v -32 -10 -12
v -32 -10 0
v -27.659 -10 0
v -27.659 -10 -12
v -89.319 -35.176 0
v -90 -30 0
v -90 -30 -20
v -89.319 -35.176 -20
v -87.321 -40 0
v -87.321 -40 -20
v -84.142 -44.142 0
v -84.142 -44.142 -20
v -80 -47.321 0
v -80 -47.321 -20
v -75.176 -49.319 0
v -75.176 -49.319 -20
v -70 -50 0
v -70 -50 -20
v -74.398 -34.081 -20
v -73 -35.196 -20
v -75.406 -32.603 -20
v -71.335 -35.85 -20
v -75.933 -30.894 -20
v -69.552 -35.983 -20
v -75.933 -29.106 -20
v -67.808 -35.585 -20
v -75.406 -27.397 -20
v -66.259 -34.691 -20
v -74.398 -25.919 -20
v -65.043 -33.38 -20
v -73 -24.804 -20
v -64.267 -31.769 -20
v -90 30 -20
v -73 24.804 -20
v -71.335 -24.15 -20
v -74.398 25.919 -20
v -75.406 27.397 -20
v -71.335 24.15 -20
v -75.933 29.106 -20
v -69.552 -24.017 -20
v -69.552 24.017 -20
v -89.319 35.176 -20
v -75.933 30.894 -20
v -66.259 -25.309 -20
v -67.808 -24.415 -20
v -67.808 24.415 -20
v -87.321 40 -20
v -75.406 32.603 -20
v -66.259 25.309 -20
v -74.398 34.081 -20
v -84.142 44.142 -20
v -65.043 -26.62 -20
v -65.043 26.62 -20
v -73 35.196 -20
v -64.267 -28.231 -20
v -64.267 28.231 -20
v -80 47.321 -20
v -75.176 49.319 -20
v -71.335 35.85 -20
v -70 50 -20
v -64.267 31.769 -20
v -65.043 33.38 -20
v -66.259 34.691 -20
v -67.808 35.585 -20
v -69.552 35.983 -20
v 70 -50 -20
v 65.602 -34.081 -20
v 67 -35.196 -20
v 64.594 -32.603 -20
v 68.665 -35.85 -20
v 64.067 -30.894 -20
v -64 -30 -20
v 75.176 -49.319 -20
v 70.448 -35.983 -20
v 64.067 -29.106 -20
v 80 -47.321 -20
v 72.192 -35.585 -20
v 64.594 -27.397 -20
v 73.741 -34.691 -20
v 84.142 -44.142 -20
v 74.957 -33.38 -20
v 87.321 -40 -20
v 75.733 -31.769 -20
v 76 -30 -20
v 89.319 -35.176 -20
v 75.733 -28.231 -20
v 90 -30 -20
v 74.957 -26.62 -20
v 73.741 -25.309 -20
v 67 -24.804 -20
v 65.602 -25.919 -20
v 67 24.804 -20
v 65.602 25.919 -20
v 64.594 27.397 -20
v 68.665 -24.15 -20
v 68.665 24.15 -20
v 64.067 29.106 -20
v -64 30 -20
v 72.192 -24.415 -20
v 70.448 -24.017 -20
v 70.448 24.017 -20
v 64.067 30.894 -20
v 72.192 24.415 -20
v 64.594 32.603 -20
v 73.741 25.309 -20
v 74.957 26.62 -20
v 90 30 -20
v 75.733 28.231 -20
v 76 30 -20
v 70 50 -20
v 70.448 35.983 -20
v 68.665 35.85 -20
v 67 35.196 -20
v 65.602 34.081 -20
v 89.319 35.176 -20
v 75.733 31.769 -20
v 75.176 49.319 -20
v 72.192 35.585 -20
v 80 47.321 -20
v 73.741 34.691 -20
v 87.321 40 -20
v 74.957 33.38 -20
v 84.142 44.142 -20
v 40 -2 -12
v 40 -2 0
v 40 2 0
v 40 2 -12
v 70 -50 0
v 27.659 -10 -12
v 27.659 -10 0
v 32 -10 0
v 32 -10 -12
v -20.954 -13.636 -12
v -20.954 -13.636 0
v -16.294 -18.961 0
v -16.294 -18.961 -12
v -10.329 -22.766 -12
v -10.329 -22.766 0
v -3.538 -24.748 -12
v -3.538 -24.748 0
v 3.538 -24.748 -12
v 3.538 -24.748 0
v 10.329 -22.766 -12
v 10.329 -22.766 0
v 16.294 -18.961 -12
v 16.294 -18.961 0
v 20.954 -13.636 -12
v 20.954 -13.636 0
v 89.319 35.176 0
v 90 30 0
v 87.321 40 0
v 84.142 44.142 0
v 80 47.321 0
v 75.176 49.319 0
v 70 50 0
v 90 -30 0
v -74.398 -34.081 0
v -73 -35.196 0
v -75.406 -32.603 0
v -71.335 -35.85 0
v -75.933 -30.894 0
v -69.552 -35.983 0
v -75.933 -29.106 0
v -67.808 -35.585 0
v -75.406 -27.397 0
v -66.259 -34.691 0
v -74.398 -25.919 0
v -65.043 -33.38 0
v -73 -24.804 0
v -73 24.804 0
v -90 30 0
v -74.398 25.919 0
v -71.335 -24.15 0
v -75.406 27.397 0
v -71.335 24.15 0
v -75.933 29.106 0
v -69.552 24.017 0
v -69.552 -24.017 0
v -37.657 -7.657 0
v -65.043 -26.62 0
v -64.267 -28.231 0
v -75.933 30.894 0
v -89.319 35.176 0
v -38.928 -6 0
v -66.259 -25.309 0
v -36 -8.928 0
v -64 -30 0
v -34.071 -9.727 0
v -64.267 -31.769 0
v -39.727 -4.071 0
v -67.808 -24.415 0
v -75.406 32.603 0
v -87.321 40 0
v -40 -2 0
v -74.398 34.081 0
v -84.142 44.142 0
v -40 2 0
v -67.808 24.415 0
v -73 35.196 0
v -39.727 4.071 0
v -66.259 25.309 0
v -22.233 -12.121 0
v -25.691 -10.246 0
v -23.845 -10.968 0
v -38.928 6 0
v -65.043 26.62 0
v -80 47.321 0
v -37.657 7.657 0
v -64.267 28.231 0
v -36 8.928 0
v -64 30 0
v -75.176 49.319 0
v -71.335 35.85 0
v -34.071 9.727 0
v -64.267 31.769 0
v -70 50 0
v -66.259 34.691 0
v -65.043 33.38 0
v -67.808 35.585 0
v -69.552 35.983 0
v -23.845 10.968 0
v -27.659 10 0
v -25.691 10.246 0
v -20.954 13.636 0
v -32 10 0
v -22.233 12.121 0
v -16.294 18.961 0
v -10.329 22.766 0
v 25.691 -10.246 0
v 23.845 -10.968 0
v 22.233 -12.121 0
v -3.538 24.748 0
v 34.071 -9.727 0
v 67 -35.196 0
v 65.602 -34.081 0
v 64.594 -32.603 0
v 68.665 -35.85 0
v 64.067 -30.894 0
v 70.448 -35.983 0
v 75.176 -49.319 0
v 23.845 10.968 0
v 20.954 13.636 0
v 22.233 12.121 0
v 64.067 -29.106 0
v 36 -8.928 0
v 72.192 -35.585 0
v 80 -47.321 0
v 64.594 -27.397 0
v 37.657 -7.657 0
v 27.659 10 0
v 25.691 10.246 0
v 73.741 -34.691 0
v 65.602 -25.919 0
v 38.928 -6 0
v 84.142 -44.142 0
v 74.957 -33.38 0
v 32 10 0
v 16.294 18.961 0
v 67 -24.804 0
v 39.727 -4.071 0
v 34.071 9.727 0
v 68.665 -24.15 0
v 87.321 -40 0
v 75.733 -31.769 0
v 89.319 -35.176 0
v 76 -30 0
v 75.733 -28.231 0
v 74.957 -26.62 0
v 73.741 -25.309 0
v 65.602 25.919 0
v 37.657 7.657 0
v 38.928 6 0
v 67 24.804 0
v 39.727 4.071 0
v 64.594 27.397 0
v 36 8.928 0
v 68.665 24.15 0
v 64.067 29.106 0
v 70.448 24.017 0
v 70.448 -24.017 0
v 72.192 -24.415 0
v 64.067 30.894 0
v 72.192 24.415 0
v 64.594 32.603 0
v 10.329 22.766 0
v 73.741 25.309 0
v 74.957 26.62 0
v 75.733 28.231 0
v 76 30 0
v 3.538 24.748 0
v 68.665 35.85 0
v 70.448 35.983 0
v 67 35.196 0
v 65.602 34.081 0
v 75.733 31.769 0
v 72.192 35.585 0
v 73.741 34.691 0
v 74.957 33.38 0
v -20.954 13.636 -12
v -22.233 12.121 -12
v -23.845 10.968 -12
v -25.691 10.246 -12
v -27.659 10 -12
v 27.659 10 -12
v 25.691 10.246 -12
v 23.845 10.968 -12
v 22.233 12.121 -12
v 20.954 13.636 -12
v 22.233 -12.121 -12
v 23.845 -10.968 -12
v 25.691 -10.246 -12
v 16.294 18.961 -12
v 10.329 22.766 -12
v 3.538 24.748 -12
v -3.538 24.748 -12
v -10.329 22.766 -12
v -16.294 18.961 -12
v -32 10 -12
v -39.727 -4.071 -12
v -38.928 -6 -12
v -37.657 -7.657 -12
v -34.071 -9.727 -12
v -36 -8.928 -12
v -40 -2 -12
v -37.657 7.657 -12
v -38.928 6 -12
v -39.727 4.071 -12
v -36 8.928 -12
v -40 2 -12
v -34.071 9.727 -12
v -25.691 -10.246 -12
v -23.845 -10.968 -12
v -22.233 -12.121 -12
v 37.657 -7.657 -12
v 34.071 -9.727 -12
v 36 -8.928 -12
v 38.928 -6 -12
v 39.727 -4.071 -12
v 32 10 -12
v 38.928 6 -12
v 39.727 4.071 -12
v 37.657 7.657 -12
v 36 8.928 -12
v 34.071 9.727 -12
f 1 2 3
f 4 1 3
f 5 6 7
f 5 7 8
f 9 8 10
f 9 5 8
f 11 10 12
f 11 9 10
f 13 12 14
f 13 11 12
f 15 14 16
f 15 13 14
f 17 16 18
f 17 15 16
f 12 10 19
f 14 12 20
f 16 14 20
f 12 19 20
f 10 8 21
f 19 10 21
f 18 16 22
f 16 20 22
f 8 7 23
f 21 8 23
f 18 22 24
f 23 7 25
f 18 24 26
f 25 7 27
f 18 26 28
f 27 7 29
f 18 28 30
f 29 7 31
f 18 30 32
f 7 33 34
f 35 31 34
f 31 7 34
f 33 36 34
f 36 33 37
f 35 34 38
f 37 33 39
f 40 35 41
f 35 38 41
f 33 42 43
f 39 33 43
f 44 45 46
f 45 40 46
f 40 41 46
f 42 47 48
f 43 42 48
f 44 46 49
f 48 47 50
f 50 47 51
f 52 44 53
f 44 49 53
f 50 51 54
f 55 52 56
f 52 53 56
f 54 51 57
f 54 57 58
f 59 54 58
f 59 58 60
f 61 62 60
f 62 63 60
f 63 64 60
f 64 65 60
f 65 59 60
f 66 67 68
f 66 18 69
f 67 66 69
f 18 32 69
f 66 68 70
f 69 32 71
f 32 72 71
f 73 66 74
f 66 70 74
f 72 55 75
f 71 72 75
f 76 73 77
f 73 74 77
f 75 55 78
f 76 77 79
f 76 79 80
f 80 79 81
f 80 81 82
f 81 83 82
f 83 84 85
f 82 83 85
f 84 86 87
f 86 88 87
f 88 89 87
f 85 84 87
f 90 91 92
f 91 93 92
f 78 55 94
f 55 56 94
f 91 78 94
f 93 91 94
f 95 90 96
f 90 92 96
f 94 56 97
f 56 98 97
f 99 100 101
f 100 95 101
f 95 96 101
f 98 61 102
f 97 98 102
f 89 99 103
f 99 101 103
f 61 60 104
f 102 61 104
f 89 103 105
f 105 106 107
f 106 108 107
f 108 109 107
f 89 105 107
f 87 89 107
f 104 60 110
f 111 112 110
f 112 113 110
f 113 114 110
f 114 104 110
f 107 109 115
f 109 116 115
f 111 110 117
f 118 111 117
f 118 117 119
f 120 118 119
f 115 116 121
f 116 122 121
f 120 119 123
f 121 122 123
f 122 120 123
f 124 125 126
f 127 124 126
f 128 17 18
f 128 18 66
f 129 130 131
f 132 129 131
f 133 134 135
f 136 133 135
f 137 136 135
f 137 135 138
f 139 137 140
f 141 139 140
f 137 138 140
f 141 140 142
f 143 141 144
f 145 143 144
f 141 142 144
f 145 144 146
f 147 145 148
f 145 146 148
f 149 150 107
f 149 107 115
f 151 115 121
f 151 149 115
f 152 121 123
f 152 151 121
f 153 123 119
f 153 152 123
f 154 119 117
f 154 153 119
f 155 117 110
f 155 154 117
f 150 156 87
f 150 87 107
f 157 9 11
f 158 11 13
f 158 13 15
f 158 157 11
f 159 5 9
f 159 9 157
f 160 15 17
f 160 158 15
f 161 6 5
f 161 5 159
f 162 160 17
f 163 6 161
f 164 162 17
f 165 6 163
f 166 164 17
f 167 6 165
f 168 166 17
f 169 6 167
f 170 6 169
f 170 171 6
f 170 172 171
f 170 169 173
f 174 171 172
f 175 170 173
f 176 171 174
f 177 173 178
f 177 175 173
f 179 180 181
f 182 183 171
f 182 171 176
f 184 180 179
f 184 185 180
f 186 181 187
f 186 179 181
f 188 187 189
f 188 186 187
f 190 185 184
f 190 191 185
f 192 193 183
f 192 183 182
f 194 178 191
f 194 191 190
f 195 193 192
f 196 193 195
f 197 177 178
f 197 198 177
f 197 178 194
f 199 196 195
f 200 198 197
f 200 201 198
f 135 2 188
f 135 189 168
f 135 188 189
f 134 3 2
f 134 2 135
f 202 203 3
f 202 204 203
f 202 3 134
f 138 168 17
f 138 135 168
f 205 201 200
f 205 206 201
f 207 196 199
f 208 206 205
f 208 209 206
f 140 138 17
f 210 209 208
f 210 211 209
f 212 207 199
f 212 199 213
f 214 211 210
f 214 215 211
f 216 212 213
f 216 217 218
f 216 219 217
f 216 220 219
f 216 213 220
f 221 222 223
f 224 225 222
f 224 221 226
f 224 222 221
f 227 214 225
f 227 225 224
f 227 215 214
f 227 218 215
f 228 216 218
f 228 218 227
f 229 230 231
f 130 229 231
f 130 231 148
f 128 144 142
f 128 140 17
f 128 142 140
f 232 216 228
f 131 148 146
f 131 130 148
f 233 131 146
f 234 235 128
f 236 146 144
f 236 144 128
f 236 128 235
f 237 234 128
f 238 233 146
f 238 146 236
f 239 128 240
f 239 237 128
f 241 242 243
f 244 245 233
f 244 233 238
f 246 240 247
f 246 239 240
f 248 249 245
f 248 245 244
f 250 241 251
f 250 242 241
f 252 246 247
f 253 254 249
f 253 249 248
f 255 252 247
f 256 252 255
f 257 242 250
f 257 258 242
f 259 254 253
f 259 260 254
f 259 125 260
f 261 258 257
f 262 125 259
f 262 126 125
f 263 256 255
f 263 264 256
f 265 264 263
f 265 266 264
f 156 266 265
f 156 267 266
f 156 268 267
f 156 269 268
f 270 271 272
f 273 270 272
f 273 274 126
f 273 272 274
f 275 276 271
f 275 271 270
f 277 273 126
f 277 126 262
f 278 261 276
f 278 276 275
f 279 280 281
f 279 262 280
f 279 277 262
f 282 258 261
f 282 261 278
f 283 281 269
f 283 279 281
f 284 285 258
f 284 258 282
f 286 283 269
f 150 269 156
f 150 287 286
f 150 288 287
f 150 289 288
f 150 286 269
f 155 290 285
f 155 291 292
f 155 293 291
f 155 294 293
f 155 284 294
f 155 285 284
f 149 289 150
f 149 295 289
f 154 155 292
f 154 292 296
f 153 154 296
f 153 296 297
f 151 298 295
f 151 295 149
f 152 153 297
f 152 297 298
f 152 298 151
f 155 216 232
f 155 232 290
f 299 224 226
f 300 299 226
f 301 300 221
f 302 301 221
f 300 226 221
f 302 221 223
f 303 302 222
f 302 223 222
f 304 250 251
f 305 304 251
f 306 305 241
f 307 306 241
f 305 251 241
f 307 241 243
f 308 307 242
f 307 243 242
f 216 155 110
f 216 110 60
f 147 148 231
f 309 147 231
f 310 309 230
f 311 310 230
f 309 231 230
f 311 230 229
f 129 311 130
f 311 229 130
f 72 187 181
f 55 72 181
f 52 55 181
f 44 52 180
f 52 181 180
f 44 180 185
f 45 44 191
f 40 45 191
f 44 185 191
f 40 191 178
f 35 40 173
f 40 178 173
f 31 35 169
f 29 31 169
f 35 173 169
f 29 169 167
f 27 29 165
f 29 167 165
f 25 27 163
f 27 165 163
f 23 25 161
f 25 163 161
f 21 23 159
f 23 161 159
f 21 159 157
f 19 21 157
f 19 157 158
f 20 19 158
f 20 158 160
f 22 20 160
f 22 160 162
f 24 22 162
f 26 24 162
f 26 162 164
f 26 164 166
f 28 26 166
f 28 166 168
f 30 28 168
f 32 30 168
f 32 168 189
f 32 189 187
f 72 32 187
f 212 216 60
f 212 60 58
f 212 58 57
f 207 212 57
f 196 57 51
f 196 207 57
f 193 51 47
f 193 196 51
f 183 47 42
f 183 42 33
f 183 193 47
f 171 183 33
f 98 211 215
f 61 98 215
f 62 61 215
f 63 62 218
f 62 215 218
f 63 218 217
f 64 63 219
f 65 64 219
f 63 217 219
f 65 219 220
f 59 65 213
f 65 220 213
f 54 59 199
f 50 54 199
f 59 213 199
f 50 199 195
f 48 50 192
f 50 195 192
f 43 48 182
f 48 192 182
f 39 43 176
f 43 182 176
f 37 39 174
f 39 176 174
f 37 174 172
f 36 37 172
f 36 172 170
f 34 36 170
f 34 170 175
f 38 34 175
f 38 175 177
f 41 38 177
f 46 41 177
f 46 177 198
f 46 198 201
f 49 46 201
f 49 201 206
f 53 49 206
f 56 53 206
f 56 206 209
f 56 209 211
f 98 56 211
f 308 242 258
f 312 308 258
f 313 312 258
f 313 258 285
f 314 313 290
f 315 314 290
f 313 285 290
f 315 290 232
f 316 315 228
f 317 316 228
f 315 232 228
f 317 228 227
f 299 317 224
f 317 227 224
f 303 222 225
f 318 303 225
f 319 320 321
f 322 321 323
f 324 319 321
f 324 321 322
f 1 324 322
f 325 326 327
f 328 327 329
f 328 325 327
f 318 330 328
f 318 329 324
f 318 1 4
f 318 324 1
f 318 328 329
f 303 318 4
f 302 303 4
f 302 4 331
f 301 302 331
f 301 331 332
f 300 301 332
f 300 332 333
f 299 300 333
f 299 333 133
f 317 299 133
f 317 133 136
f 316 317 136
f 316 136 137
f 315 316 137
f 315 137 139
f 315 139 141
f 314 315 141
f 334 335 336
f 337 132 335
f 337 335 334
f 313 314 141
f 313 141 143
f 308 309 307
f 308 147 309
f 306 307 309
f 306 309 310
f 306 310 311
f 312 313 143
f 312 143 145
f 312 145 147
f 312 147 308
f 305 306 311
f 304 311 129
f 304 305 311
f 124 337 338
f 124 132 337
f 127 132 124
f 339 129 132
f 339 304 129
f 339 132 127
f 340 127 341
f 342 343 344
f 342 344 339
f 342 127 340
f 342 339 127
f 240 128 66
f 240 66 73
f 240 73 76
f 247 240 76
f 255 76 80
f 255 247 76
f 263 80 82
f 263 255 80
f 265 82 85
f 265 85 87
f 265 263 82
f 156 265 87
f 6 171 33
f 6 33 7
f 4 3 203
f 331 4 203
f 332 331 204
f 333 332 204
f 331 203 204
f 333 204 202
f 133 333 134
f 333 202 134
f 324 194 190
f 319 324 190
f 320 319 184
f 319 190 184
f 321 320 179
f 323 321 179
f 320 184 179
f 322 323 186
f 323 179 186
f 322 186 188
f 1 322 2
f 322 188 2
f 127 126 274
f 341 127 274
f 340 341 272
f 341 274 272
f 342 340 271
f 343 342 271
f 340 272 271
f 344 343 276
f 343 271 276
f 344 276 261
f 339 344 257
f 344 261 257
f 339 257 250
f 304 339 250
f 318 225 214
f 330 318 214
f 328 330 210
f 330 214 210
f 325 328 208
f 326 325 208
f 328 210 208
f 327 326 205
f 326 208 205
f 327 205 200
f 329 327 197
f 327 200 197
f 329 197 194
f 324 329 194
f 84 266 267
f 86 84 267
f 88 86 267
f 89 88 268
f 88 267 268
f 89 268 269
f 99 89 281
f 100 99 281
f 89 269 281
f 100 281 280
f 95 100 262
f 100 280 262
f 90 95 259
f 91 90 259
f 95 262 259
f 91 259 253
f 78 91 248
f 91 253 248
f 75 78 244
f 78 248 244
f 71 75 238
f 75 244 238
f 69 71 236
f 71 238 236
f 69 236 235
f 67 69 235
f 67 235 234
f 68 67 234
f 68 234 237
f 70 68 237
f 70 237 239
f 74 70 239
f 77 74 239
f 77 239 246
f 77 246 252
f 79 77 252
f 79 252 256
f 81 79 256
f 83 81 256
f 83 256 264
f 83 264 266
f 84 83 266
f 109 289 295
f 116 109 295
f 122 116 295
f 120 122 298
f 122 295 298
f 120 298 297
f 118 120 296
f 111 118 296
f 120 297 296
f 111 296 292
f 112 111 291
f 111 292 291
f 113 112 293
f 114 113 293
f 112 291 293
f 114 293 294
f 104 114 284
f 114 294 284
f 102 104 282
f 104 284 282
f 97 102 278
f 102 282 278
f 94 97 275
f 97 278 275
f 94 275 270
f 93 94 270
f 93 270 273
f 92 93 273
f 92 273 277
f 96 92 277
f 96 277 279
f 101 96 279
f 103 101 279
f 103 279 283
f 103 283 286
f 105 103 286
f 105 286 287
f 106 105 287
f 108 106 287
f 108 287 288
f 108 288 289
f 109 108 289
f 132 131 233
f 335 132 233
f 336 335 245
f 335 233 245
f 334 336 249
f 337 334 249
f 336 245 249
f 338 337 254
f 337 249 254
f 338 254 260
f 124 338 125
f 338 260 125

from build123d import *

# Parameters (mm, degrees)
F1_DEPTH = 20
F2_R     = 6
F3_DEPTH = 25
F5_DEPTH = 12


with BuildPart() as f1:
    # F0 (on Top) → F1 (new body)
    with BuildSketch(Plane.XY):
        with BuildLine():
            ThreePointArc((90, 30), (84.142136, 44.142136), (70, 50))
            Line((70, 50), (-70, 50))
            ThreePointArc((-70, 50), (-84.142136, 44.142136), (-90, 30))
            Line((-90, 30), (-90, -30))
            ThreePointArc((-90, -30), (-84.142136, -44.142136), (-70, -50))
            Line((-70, -50), (70, -50))
            ThreePointArc((70, -50), (84.142136, -44.142136), (90, -30))
            Line((90, -30), (90, 30))
        make_face()
    extrude(amount=-F1_DEPTH)

    # F2 (on face) → F3 (cut)
    with BuildSketch(Plane.XY):
        with Locations((70, 30)):
            Circle(F2_R)
        with Locations((-70, 30)):
            Circle(F2_R)
        with Locations((70, -30)):
            Circle(F2_R)
        with Locations((-70, -30)):
            Circle(F2_R)
    extrude(amount=-F3_DEPTH, mode=Mode.SUBTRACT)

    # F4 (on face) → F5 (cut)
    with BuildSketch(Plane.XY):
        with BuildLine():
            Line((27.658633, -10), (32, -10))
            ThreePointArc((32, -10), (37.656854, -7.656854), (40, -2))
            Line((40, -2), (40, 2))
            ThreePointArc((40, 2), (37.656854, 7.656854), (32, 10))
            Line((32, 10), (27.658633, 10))
            ThreePointArc((27.658633, 10), (23.844783, 10.967607), (20.95351, 13.636364))
            ThreePointArc((20.95351, 13.636364), (0, 25), (-20.95351, 13.636364))
            ThreePointArc((-20.95351, 13.636364), (-23.844783, 10.967607), (-27.658633, 10))
            Line((-27.658633, 10), (-32, 10))
            ThreePointArc((-32, 10), (-37.656854, 7.656854), (-40, 2))
            Line((-40, 2), (-40, -2))
            ThreePointArc((-40, -2), (-37.656854, -7.656854), (-32, -10))
            Line((-32, -10), (-27.658633, -10))
            ThreePointArc((-27.658633, -10), (-23.844783, -10.967607), (-20.95351, -13.636364))
            ThreePointArc((-20.95351, -13.636364), (0, -25), (20.95351, -13.636364))
            ThreePointArc((20.95351, -13.636364), (23.844783, -10.967607), (27.658633, -10))
        make_face()
    extrude(amount=-F5_DEPTH, mode=Mode.SUBTRACT)


solid = f1.part
